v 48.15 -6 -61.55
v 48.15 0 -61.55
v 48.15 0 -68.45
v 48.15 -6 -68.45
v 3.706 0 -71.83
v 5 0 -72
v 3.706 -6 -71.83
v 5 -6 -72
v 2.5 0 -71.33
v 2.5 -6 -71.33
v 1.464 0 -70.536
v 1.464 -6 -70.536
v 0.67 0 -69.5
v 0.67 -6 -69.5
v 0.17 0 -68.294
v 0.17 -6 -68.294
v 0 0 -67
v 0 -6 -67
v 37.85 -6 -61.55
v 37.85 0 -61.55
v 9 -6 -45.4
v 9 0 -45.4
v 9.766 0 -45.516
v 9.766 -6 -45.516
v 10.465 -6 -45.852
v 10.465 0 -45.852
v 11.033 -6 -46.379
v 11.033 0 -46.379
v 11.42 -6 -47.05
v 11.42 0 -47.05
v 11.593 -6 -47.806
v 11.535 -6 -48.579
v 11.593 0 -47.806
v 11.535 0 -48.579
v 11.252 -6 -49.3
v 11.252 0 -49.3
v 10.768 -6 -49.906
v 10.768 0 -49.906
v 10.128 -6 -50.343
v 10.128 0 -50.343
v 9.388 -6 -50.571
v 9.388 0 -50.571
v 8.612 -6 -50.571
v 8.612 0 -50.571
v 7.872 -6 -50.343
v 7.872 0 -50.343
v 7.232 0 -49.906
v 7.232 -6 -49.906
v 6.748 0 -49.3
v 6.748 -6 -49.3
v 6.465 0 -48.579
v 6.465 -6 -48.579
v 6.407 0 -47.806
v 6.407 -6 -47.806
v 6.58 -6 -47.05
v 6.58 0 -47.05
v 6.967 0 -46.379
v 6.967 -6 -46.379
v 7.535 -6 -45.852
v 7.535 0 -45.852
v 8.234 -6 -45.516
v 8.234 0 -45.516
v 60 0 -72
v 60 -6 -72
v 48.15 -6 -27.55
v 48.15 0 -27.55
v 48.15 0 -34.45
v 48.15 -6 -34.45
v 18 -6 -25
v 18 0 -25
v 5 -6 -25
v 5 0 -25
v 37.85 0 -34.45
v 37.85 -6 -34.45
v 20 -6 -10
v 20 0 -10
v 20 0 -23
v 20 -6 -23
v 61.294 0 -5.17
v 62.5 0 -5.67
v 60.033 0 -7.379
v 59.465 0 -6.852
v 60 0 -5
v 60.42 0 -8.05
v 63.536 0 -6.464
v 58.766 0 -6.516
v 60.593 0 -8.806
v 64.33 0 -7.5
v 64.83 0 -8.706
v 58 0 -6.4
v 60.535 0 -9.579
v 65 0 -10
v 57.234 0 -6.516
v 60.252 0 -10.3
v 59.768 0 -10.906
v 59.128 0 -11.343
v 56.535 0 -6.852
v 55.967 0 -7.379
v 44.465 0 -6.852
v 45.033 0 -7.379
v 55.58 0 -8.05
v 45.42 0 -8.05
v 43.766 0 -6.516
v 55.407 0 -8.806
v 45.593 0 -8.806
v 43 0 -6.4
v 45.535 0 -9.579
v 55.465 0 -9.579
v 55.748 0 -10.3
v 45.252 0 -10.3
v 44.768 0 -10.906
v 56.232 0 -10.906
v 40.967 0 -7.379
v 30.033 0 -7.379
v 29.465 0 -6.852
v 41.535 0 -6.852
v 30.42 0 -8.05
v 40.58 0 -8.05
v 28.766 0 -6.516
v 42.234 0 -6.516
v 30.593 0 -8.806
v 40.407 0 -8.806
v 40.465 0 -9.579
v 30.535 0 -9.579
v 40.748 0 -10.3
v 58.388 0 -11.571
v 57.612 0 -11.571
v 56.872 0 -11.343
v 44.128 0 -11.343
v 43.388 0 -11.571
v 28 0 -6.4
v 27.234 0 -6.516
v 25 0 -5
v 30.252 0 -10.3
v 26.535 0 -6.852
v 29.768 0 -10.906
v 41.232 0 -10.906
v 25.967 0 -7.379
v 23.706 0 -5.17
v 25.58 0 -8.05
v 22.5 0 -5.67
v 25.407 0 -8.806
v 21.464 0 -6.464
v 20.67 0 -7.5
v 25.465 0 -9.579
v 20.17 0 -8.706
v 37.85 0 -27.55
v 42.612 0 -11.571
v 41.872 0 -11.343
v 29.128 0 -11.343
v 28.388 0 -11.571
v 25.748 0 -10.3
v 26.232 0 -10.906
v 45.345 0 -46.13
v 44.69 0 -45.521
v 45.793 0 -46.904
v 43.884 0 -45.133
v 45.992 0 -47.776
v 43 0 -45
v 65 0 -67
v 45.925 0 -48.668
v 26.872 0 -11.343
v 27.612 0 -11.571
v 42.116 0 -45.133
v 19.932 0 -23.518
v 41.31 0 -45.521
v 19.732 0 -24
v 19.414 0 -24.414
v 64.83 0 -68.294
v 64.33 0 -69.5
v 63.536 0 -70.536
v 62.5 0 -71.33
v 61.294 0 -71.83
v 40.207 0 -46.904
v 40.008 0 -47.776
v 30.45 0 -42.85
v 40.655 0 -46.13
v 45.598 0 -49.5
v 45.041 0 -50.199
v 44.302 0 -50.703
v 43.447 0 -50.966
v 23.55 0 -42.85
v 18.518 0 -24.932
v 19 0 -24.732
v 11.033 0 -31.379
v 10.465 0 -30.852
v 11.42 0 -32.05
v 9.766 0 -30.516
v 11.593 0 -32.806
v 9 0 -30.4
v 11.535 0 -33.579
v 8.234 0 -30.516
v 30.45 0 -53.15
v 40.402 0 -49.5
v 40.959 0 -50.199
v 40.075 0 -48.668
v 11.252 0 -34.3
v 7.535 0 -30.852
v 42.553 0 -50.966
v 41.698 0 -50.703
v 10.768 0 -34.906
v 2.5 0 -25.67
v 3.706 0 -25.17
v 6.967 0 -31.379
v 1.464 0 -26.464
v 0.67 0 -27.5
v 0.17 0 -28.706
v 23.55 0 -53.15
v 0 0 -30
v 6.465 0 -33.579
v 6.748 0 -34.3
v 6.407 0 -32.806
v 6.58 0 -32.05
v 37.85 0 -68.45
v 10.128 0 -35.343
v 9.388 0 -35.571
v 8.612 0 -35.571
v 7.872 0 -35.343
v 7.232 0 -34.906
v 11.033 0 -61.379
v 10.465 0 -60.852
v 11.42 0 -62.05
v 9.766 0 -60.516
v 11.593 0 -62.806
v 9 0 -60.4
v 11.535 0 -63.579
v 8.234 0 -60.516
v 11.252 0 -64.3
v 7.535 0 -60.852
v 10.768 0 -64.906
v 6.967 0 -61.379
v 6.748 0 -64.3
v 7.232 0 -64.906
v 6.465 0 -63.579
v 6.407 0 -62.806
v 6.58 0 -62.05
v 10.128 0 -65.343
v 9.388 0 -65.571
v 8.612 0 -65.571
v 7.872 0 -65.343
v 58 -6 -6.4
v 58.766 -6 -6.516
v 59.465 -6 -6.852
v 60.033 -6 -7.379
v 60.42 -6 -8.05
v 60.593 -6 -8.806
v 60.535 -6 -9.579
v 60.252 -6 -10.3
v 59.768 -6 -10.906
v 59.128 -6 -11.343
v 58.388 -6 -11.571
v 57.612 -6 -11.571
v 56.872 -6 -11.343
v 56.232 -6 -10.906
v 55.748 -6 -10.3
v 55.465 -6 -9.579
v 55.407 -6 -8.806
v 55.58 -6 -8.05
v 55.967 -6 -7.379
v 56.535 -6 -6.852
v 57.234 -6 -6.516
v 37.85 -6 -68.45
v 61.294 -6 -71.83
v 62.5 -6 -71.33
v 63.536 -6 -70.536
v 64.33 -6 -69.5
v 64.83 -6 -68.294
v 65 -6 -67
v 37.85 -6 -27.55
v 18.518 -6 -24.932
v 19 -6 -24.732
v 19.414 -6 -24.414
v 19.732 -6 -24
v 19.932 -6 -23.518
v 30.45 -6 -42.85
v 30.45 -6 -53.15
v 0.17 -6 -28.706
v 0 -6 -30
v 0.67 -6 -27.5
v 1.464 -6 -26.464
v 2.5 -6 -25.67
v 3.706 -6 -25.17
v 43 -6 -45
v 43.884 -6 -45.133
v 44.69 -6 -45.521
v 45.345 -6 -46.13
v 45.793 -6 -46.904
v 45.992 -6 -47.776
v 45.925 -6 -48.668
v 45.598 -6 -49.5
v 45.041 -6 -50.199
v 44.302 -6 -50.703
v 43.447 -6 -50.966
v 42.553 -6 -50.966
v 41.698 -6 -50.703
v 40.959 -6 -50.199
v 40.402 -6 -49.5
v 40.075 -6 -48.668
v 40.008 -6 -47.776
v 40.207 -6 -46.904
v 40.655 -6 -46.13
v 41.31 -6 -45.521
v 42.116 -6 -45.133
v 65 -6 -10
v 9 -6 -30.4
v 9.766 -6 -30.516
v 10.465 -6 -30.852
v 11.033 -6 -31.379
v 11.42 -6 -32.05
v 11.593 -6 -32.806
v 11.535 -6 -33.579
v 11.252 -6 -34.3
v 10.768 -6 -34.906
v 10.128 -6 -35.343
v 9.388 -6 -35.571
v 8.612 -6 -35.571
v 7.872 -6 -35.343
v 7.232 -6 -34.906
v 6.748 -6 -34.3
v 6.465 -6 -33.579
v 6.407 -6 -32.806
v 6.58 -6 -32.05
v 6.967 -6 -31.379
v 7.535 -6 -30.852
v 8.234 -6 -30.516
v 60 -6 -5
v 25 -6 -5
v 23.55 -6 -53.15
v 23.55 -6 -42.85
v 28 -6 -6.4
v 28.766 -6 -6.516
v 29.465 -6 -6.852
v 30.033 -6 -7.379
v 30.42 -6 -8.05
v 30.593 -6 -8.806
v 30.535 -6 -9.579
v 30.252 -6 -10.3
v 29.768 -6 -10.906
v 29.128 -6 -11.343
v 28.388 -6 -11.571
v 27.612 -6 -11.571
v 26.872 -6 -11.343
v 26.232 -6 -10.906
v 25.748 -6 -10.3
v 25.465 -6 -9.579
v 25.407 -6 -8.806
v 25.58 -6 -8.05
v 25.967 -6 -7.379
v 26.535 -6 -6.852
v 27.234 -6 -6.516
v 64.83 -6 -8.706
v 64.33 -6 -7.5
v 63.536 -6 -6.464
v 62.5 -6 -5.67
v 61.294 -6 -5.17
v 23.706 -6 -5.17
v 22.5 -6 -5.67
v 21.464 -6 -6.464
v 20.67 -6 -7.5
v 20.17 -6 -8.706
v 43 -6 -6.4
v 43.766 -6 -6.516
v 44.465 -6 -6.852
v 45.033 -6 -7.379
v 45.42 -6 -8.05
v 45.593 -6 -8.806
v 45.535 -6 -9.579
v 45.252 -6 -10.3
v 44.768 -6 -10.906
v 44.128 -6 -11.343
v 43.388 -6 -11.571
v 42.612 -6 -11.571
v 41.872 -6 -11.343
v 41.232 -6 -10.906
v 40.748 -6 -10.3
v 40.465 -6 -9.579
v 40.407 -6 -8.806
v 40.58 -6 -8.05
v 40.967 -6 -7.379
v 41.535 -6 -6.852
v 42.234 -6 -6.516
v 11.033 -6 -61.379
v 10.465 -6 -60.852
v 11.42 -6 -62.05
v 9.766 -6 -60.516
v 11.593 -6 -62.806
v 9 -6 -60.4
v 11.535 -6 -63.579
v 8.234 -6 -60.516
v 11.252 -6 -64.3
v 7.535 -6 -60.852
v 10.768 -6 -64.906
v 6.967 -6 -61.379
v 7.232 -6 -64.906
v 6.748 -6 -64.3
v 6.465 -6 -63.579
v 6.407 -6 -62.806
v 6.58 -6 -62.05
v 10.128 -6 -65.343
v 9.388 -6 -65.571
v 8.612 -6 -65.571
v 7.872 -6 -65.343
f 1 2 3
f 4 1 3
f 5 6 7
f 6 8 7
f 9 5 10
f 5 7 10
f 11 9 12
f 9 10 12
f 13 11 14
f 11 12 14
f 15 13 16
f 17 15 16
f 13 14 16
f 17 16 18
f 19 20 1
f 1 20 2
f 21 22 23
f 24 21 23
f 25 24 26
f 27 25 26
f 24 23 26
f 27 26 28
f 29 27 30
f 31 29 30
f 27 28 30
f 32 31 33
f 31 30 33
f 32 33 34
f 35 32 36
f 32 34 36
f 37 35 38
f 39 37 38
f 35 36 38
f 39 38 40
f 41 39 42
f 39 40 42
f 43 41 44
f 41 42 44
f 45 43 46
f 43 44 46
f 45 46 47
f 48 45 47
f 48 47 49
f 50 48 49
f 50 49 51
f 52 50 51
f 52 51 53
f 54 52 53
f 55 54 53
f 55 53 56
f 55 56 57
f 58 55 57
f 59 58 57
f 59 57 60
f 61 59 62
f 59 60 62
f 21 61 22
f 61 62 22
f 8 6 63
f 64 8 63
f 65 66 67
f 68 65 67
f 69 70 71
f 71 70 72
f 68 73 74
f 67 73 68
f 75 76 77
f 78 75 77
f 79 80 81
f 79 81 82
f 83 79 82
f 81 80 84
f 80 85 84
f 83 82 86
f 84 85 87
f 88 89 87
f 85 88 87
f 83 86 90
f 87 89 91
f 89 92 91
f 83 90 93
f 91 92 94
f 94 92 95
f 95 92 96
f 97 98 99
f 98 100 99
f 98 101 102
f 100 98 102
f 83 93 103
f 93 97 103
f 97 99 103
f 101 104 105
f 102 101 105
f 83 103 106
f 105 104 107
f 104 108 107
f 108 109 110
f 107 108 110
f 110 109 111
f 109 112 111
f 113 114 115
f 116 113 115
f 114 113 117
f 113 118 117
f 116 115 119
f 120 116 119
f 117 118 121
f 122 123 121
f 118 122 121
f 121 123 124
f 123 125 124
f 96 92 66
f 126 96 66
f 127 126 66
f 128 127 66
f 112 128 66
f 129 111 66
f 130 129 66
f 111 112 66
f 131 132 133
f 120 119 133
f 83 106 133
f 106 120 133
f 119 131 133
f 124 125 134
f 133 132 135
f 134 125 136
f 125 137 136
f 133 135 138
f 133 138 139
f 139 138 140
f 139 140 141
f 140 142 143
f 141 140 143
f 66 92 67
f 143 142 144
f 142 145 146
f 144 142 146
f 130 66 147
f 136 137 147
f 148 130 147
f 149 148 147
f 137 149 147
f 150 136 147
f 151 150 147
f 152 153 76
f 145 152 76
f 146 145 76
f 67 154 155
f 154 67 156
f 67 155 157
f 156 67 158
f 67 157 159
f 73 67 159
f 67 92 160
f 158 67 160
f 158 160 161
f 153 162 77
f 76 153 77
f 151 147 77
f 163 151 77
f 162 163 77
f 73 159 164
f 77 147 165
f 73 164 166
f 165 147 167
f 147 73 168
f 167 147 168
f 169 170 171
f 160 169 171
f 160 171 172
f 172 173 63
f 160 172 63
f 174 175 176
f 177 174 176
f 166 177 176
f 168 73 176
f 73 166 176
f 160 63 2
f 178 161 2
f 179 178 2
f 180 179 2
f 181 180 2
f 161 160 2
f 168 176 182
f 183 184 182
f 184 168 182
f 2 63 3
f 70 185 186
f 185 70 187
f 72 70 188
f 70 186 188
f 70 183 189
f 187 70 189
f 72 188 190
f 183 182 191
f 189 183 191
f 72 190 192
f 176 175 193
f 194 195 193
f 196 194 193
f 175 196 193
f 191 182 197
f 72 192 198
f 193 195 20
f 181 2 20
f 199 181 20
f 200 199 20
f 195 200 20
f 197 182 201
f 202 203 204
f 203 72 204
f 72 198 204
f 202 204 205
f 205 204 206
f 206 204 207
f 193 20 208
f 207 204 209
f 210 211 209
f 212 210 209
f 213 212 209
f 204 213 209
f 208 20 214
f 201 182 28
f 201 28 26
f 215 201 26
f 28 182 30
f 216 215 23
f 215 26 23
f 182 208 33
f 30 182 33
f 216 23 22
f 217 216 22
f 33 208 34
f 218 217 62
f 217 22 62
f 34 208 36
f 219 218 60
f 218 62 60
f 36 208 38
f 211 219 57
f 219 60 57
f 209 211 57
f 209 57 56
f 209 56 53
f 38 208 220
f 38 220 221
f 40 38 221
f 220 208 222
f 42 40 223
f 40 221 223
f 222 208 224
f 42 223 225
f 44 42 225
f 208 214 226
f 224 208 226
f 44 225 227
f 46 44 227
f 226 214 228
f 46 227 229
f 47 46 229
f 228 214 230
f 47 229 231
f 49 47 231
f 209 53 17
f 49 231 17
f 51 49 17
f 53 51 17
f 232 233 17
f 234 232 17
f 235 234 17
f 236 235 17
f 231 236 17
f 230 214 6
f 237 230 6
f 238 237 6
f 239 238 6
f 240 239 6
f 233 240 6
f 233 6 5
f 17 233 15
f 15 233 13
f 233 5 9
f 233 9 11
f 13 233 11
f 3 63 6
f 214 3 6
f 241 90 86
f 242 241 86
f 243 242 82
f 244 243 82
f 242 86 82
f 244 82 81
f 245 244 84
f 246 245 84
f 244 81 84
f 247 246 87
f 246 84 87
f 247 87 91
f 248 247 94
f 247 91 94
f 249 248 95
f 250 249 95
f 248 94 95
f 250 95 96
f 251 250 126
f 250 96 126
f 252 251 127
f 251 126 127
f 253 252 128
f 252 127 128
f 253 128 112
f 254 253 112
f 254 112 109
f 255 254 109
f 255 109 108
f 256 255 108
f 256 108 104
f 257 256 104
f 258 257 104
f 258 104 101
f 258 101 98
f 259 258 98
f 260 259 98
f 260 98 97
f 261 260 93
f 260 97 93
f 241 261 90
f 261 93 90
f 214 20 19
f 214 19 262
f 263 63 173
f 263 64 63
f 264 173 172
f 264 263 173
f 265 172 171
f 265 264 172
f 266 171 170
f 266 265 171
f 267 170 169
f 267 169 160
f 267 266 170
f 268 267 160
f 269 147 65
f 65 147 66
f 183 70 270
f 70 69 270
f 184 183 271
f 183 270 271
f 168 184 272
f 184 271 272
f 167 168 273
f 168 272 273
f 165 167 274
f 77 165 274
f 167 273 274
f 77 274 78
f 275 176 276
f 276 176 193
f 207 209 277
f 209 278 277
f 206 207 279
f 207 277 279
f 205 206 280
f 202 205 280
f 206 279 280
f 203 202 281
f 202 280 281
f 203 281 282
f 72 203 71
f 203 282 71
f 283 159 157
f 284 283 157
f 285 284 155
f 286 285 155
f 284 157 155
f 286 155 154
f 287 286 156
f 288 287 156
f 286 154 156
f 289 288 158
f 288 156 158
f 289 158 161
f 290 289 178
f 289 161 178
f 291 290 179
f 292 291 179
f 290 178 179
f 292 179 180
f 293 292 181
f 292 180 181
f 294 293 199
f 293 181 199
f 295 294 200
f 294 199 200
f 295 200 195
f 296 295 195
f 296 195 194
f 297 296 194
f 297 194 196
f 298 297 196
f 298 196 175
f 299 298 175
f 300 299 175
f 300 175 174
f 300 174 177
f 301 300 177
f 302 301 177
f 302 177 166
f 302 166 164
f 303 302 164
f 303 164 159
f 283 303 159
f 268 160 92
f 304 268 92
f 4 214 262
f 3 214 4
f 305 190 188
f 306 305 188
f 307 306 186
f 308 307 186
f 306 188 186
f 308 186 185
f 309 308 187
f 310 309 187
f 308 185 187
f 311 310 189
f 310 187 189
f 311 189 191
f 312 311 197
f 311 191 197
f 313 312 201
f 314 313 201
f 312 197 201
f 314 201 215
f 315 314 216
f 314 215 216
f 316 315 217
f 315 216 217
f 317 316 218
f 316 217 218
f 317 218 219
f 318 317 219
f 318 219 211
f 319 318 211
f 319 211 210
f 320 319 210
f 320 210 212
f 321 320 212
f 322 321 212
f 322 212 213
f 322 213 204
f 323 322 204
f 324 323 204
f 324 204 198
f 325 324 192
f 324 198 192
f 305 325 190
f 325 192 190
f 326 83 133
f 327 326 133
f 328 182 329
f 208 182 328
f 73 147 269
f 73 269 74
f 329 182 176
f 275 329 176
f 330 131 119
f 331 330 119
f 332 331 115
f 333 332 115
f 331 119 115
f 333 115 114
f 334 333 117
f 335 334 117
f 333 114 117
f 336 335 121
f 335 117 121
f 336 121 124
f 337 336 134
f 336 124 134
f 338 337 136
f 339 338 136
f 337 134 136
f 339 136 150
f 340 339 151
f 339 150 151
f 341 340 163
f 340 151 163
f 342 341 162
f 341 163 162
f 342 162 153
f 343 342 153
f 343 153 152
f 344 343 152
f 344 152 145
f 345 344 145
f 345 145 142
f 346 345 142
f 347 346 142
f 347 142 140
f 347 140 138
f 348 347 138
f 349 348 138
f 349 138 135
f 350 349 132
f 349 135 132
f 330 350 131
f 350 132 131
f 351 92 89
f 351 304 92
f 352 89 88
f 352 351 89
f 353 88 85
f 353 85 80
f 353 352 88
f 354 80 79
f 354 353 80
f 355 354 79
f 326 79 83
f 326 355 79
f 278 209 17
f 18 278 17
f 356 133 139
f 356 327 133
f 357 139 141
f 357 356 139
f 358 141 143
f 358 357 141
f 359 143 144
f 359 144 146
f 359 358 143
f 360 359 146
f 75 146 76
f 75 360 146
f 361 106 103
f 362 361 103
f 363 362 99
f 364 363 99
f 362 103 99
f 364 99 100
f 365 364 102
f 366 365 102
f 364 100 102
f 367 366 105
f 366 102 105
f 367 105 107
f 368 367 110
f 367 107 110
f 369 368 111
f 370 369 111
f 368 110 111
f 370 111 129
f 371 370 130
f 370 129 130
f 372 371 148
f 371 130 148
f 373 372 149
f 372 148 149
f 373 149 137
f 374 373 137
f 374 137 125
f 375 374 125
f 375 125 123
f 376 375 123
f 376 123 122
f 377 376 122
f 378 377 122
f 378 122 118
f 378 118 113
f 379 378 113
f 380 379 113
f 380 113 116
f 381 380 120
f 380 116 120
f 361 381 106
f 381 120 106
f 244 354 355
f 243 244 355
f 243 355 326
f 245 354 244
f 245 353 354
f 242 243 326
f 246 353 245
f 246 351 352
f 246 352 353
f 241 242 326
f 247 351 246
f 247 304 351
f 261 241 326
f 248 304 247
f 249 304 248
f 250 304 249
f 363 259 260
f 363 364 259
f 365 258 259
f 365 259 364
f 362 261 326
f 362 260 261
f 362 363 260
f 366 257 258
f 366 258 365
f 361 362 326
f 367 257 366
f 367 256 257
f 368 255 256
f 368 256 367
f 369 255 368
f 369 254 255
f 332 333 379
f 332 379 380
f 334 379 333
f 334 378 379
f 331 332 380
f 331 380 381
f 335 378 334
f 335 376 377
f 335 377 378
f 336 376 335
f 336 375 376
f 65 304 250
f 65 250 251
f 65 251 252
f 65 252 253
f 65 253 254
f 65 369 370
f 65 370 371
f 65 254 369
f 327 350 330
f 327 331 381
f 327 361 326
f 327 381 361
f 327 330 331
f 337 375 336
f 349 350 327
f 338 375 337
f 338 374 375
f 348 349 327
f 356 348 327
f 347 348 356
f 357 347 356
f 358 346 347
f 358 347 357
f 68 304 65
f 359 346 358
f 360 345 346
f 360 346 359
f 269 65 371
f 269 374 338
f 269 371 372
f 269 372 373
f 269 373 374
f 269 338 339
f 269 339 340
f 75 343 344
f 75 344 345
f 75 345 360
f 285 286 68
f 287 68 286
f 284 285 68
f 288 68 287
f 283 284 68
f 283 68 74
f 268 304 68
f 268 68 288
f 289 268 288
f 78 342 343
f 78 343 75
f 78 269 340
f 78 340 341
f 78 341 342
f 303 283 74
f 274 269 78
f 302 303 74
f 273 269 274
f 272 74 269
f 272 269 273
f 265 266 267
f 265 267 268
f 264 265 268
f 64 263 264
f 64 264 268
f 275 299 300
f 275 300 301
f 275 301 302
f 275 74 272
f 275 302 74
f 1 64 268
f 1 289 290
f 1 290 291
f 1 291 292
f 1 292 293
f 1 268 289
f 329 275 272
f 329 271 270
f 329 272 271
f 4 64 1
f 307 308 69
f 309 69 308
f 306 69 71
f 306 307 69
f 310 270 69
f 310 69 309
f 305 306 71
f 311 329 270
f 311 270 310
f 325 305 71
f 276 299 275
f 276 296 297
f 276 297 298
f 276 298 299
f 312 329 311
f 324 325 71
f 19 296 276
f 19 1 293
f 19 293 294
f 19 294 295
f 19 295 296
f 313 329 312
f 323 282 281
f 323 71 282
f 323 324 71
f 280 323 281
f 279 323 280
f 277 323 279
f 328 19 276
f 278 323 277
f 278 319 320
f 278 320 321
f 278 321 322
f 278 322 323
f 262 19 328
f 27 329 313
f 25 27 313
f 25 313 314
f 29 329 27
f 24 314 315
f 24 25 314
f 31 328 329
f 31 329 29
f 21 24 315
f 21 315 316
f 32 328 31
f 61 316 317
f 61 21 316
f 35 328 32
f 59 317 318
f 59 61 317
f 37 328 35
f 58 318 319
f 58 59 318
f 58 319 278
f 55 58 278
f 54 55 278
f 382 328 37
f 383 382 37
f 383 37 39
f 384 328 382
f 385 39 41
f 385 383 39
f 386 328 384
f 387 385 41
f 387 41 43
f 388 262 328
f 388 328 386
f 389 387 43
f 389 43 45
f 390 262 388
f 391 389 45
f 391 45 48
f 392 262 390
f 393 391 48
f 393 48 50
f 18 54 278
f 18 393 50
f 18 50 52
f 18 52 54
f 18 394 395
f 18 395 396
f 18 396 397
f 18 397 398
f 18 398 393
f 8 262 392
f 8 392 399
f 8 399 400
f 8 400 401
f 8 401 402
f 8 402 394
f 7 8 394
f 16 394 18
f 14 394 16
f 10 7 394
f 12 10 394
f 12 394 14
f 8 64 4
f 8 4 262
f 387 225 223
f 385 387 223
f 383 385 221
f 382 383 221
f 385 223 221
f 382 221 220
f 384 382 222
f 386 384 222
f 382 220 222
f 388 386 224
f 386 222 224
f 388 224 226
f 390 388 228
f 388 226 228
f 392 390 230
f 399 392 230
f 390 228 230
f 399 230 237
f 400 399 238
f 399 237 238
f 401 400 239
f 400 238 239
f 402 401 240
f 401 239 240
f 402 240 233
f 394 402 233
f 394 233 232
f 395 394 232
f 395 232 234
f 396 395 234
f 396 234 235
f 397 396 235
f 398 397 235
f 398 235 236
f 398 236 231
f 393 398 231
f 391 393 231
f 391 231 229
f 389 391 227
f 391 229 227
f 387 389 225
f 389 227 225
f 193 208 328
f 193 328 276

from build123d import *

# Parameters (mm, degrees)
SKETCH2_R          = 2.6
BASE_FLANGE1_DEPTH = 6
FILLET1_R          = 5
FILLET2_R          = 2
SKETCH6_R          = 3
SKETCH6_W          = 6.9
SKETCH6_H          = 10.3
SKETCH6_W_2        = 10.3
SKETCH6_H_2        = 6.9
CUT_EXTRUDE3_DEPTH = 10


# Sheet-metal steps are written as plain solids
with BuildPart() as part:
    # Sketch2 → Base-Flange1 (new body)
    with BuildSketch(Plane(origin=(0, 0, 0), x_dir=(1, 0, 0), z_dir=(0, 1, 0))):
        Polygon((0, 72), (65, 72), (65, 5), (20, 5), (20, 25), (0, 25), align=None)
        with Locations(Location((28, 9, 0), (0, 0, 270))):
            Circle(SKETCH2_R, mode=Mode.SUBTRACT)
        with Locations(Location((43, 9, 0), (0, 0, 270))):
            Circle(SKETCH2_R, mode=Mode.SUBTRACT)
        with Locations(Location((58, 9, 0), (0, 0, 270))):
            Circle(SKETCH2_R, mode=Mode.SUBTRACT)
        with Locations(Location((9, 33, 0), (0, 0, 270))):
            Circle(SKETCH2_R, mode=Mode.SUBTRACT)
        with Locations(Location((9, 48, 0), (0, 0, 270))):
            Circle(SKETCH2_R, mode=Mode.SUBTRACT)
        with Locations(Location((9, 63, 0), (0, 0, 270))):
            Circle(SKETCH2_R, mode=Mode.SUBTRACT)
    extrude(amount=-BASE_FLANGE1_DEPTH)

    # Fillet1
    fillet1_edges = [part.edges().sort_by_distance(p)[0] for p in [
        (0, -3, -25),
        (0, -3, -72),
        (65, -3, -72),
        (65, -3, -5),
        (20, -3, -5),
    ]]
    fillet(fillet1_edges, radius=FILLET1_R)

    # Fillet2
    fillet2_edges = [part.edges().sort_by_distance(p)[0] for p in [
        (20, -3, -25),
    ]]
    fillet(fillet2_edges, radius=FILLET2_R)

    # Sketch6 → Cut-Extrude3 (cut)
    with BuildSketch(Plane(origin=(0, 0, 0), x_dir=(1, 0, 0), z_dir=(0, 1, 0))):
        with Locations(Location((43, 48, 0), (0, 0, 270))):
            Circle(SKETCH6_R)
        with Locations((27, 48)):
            Rectangle(SKETCH6_W, SKETCH6_H)
        with Locations((43, 31)):
            Rectangle(SKETCH6_W_2, SKETCH6_H_2)
        with Locations((43, 65)):
            Rectangle(SKETCH6_W_2, SKETCH6_H_2)
    extrude(amount=-CUT_EXTRUDE3_DEPTH, mode=Mode.SUBTRACT)


solid = part.part
